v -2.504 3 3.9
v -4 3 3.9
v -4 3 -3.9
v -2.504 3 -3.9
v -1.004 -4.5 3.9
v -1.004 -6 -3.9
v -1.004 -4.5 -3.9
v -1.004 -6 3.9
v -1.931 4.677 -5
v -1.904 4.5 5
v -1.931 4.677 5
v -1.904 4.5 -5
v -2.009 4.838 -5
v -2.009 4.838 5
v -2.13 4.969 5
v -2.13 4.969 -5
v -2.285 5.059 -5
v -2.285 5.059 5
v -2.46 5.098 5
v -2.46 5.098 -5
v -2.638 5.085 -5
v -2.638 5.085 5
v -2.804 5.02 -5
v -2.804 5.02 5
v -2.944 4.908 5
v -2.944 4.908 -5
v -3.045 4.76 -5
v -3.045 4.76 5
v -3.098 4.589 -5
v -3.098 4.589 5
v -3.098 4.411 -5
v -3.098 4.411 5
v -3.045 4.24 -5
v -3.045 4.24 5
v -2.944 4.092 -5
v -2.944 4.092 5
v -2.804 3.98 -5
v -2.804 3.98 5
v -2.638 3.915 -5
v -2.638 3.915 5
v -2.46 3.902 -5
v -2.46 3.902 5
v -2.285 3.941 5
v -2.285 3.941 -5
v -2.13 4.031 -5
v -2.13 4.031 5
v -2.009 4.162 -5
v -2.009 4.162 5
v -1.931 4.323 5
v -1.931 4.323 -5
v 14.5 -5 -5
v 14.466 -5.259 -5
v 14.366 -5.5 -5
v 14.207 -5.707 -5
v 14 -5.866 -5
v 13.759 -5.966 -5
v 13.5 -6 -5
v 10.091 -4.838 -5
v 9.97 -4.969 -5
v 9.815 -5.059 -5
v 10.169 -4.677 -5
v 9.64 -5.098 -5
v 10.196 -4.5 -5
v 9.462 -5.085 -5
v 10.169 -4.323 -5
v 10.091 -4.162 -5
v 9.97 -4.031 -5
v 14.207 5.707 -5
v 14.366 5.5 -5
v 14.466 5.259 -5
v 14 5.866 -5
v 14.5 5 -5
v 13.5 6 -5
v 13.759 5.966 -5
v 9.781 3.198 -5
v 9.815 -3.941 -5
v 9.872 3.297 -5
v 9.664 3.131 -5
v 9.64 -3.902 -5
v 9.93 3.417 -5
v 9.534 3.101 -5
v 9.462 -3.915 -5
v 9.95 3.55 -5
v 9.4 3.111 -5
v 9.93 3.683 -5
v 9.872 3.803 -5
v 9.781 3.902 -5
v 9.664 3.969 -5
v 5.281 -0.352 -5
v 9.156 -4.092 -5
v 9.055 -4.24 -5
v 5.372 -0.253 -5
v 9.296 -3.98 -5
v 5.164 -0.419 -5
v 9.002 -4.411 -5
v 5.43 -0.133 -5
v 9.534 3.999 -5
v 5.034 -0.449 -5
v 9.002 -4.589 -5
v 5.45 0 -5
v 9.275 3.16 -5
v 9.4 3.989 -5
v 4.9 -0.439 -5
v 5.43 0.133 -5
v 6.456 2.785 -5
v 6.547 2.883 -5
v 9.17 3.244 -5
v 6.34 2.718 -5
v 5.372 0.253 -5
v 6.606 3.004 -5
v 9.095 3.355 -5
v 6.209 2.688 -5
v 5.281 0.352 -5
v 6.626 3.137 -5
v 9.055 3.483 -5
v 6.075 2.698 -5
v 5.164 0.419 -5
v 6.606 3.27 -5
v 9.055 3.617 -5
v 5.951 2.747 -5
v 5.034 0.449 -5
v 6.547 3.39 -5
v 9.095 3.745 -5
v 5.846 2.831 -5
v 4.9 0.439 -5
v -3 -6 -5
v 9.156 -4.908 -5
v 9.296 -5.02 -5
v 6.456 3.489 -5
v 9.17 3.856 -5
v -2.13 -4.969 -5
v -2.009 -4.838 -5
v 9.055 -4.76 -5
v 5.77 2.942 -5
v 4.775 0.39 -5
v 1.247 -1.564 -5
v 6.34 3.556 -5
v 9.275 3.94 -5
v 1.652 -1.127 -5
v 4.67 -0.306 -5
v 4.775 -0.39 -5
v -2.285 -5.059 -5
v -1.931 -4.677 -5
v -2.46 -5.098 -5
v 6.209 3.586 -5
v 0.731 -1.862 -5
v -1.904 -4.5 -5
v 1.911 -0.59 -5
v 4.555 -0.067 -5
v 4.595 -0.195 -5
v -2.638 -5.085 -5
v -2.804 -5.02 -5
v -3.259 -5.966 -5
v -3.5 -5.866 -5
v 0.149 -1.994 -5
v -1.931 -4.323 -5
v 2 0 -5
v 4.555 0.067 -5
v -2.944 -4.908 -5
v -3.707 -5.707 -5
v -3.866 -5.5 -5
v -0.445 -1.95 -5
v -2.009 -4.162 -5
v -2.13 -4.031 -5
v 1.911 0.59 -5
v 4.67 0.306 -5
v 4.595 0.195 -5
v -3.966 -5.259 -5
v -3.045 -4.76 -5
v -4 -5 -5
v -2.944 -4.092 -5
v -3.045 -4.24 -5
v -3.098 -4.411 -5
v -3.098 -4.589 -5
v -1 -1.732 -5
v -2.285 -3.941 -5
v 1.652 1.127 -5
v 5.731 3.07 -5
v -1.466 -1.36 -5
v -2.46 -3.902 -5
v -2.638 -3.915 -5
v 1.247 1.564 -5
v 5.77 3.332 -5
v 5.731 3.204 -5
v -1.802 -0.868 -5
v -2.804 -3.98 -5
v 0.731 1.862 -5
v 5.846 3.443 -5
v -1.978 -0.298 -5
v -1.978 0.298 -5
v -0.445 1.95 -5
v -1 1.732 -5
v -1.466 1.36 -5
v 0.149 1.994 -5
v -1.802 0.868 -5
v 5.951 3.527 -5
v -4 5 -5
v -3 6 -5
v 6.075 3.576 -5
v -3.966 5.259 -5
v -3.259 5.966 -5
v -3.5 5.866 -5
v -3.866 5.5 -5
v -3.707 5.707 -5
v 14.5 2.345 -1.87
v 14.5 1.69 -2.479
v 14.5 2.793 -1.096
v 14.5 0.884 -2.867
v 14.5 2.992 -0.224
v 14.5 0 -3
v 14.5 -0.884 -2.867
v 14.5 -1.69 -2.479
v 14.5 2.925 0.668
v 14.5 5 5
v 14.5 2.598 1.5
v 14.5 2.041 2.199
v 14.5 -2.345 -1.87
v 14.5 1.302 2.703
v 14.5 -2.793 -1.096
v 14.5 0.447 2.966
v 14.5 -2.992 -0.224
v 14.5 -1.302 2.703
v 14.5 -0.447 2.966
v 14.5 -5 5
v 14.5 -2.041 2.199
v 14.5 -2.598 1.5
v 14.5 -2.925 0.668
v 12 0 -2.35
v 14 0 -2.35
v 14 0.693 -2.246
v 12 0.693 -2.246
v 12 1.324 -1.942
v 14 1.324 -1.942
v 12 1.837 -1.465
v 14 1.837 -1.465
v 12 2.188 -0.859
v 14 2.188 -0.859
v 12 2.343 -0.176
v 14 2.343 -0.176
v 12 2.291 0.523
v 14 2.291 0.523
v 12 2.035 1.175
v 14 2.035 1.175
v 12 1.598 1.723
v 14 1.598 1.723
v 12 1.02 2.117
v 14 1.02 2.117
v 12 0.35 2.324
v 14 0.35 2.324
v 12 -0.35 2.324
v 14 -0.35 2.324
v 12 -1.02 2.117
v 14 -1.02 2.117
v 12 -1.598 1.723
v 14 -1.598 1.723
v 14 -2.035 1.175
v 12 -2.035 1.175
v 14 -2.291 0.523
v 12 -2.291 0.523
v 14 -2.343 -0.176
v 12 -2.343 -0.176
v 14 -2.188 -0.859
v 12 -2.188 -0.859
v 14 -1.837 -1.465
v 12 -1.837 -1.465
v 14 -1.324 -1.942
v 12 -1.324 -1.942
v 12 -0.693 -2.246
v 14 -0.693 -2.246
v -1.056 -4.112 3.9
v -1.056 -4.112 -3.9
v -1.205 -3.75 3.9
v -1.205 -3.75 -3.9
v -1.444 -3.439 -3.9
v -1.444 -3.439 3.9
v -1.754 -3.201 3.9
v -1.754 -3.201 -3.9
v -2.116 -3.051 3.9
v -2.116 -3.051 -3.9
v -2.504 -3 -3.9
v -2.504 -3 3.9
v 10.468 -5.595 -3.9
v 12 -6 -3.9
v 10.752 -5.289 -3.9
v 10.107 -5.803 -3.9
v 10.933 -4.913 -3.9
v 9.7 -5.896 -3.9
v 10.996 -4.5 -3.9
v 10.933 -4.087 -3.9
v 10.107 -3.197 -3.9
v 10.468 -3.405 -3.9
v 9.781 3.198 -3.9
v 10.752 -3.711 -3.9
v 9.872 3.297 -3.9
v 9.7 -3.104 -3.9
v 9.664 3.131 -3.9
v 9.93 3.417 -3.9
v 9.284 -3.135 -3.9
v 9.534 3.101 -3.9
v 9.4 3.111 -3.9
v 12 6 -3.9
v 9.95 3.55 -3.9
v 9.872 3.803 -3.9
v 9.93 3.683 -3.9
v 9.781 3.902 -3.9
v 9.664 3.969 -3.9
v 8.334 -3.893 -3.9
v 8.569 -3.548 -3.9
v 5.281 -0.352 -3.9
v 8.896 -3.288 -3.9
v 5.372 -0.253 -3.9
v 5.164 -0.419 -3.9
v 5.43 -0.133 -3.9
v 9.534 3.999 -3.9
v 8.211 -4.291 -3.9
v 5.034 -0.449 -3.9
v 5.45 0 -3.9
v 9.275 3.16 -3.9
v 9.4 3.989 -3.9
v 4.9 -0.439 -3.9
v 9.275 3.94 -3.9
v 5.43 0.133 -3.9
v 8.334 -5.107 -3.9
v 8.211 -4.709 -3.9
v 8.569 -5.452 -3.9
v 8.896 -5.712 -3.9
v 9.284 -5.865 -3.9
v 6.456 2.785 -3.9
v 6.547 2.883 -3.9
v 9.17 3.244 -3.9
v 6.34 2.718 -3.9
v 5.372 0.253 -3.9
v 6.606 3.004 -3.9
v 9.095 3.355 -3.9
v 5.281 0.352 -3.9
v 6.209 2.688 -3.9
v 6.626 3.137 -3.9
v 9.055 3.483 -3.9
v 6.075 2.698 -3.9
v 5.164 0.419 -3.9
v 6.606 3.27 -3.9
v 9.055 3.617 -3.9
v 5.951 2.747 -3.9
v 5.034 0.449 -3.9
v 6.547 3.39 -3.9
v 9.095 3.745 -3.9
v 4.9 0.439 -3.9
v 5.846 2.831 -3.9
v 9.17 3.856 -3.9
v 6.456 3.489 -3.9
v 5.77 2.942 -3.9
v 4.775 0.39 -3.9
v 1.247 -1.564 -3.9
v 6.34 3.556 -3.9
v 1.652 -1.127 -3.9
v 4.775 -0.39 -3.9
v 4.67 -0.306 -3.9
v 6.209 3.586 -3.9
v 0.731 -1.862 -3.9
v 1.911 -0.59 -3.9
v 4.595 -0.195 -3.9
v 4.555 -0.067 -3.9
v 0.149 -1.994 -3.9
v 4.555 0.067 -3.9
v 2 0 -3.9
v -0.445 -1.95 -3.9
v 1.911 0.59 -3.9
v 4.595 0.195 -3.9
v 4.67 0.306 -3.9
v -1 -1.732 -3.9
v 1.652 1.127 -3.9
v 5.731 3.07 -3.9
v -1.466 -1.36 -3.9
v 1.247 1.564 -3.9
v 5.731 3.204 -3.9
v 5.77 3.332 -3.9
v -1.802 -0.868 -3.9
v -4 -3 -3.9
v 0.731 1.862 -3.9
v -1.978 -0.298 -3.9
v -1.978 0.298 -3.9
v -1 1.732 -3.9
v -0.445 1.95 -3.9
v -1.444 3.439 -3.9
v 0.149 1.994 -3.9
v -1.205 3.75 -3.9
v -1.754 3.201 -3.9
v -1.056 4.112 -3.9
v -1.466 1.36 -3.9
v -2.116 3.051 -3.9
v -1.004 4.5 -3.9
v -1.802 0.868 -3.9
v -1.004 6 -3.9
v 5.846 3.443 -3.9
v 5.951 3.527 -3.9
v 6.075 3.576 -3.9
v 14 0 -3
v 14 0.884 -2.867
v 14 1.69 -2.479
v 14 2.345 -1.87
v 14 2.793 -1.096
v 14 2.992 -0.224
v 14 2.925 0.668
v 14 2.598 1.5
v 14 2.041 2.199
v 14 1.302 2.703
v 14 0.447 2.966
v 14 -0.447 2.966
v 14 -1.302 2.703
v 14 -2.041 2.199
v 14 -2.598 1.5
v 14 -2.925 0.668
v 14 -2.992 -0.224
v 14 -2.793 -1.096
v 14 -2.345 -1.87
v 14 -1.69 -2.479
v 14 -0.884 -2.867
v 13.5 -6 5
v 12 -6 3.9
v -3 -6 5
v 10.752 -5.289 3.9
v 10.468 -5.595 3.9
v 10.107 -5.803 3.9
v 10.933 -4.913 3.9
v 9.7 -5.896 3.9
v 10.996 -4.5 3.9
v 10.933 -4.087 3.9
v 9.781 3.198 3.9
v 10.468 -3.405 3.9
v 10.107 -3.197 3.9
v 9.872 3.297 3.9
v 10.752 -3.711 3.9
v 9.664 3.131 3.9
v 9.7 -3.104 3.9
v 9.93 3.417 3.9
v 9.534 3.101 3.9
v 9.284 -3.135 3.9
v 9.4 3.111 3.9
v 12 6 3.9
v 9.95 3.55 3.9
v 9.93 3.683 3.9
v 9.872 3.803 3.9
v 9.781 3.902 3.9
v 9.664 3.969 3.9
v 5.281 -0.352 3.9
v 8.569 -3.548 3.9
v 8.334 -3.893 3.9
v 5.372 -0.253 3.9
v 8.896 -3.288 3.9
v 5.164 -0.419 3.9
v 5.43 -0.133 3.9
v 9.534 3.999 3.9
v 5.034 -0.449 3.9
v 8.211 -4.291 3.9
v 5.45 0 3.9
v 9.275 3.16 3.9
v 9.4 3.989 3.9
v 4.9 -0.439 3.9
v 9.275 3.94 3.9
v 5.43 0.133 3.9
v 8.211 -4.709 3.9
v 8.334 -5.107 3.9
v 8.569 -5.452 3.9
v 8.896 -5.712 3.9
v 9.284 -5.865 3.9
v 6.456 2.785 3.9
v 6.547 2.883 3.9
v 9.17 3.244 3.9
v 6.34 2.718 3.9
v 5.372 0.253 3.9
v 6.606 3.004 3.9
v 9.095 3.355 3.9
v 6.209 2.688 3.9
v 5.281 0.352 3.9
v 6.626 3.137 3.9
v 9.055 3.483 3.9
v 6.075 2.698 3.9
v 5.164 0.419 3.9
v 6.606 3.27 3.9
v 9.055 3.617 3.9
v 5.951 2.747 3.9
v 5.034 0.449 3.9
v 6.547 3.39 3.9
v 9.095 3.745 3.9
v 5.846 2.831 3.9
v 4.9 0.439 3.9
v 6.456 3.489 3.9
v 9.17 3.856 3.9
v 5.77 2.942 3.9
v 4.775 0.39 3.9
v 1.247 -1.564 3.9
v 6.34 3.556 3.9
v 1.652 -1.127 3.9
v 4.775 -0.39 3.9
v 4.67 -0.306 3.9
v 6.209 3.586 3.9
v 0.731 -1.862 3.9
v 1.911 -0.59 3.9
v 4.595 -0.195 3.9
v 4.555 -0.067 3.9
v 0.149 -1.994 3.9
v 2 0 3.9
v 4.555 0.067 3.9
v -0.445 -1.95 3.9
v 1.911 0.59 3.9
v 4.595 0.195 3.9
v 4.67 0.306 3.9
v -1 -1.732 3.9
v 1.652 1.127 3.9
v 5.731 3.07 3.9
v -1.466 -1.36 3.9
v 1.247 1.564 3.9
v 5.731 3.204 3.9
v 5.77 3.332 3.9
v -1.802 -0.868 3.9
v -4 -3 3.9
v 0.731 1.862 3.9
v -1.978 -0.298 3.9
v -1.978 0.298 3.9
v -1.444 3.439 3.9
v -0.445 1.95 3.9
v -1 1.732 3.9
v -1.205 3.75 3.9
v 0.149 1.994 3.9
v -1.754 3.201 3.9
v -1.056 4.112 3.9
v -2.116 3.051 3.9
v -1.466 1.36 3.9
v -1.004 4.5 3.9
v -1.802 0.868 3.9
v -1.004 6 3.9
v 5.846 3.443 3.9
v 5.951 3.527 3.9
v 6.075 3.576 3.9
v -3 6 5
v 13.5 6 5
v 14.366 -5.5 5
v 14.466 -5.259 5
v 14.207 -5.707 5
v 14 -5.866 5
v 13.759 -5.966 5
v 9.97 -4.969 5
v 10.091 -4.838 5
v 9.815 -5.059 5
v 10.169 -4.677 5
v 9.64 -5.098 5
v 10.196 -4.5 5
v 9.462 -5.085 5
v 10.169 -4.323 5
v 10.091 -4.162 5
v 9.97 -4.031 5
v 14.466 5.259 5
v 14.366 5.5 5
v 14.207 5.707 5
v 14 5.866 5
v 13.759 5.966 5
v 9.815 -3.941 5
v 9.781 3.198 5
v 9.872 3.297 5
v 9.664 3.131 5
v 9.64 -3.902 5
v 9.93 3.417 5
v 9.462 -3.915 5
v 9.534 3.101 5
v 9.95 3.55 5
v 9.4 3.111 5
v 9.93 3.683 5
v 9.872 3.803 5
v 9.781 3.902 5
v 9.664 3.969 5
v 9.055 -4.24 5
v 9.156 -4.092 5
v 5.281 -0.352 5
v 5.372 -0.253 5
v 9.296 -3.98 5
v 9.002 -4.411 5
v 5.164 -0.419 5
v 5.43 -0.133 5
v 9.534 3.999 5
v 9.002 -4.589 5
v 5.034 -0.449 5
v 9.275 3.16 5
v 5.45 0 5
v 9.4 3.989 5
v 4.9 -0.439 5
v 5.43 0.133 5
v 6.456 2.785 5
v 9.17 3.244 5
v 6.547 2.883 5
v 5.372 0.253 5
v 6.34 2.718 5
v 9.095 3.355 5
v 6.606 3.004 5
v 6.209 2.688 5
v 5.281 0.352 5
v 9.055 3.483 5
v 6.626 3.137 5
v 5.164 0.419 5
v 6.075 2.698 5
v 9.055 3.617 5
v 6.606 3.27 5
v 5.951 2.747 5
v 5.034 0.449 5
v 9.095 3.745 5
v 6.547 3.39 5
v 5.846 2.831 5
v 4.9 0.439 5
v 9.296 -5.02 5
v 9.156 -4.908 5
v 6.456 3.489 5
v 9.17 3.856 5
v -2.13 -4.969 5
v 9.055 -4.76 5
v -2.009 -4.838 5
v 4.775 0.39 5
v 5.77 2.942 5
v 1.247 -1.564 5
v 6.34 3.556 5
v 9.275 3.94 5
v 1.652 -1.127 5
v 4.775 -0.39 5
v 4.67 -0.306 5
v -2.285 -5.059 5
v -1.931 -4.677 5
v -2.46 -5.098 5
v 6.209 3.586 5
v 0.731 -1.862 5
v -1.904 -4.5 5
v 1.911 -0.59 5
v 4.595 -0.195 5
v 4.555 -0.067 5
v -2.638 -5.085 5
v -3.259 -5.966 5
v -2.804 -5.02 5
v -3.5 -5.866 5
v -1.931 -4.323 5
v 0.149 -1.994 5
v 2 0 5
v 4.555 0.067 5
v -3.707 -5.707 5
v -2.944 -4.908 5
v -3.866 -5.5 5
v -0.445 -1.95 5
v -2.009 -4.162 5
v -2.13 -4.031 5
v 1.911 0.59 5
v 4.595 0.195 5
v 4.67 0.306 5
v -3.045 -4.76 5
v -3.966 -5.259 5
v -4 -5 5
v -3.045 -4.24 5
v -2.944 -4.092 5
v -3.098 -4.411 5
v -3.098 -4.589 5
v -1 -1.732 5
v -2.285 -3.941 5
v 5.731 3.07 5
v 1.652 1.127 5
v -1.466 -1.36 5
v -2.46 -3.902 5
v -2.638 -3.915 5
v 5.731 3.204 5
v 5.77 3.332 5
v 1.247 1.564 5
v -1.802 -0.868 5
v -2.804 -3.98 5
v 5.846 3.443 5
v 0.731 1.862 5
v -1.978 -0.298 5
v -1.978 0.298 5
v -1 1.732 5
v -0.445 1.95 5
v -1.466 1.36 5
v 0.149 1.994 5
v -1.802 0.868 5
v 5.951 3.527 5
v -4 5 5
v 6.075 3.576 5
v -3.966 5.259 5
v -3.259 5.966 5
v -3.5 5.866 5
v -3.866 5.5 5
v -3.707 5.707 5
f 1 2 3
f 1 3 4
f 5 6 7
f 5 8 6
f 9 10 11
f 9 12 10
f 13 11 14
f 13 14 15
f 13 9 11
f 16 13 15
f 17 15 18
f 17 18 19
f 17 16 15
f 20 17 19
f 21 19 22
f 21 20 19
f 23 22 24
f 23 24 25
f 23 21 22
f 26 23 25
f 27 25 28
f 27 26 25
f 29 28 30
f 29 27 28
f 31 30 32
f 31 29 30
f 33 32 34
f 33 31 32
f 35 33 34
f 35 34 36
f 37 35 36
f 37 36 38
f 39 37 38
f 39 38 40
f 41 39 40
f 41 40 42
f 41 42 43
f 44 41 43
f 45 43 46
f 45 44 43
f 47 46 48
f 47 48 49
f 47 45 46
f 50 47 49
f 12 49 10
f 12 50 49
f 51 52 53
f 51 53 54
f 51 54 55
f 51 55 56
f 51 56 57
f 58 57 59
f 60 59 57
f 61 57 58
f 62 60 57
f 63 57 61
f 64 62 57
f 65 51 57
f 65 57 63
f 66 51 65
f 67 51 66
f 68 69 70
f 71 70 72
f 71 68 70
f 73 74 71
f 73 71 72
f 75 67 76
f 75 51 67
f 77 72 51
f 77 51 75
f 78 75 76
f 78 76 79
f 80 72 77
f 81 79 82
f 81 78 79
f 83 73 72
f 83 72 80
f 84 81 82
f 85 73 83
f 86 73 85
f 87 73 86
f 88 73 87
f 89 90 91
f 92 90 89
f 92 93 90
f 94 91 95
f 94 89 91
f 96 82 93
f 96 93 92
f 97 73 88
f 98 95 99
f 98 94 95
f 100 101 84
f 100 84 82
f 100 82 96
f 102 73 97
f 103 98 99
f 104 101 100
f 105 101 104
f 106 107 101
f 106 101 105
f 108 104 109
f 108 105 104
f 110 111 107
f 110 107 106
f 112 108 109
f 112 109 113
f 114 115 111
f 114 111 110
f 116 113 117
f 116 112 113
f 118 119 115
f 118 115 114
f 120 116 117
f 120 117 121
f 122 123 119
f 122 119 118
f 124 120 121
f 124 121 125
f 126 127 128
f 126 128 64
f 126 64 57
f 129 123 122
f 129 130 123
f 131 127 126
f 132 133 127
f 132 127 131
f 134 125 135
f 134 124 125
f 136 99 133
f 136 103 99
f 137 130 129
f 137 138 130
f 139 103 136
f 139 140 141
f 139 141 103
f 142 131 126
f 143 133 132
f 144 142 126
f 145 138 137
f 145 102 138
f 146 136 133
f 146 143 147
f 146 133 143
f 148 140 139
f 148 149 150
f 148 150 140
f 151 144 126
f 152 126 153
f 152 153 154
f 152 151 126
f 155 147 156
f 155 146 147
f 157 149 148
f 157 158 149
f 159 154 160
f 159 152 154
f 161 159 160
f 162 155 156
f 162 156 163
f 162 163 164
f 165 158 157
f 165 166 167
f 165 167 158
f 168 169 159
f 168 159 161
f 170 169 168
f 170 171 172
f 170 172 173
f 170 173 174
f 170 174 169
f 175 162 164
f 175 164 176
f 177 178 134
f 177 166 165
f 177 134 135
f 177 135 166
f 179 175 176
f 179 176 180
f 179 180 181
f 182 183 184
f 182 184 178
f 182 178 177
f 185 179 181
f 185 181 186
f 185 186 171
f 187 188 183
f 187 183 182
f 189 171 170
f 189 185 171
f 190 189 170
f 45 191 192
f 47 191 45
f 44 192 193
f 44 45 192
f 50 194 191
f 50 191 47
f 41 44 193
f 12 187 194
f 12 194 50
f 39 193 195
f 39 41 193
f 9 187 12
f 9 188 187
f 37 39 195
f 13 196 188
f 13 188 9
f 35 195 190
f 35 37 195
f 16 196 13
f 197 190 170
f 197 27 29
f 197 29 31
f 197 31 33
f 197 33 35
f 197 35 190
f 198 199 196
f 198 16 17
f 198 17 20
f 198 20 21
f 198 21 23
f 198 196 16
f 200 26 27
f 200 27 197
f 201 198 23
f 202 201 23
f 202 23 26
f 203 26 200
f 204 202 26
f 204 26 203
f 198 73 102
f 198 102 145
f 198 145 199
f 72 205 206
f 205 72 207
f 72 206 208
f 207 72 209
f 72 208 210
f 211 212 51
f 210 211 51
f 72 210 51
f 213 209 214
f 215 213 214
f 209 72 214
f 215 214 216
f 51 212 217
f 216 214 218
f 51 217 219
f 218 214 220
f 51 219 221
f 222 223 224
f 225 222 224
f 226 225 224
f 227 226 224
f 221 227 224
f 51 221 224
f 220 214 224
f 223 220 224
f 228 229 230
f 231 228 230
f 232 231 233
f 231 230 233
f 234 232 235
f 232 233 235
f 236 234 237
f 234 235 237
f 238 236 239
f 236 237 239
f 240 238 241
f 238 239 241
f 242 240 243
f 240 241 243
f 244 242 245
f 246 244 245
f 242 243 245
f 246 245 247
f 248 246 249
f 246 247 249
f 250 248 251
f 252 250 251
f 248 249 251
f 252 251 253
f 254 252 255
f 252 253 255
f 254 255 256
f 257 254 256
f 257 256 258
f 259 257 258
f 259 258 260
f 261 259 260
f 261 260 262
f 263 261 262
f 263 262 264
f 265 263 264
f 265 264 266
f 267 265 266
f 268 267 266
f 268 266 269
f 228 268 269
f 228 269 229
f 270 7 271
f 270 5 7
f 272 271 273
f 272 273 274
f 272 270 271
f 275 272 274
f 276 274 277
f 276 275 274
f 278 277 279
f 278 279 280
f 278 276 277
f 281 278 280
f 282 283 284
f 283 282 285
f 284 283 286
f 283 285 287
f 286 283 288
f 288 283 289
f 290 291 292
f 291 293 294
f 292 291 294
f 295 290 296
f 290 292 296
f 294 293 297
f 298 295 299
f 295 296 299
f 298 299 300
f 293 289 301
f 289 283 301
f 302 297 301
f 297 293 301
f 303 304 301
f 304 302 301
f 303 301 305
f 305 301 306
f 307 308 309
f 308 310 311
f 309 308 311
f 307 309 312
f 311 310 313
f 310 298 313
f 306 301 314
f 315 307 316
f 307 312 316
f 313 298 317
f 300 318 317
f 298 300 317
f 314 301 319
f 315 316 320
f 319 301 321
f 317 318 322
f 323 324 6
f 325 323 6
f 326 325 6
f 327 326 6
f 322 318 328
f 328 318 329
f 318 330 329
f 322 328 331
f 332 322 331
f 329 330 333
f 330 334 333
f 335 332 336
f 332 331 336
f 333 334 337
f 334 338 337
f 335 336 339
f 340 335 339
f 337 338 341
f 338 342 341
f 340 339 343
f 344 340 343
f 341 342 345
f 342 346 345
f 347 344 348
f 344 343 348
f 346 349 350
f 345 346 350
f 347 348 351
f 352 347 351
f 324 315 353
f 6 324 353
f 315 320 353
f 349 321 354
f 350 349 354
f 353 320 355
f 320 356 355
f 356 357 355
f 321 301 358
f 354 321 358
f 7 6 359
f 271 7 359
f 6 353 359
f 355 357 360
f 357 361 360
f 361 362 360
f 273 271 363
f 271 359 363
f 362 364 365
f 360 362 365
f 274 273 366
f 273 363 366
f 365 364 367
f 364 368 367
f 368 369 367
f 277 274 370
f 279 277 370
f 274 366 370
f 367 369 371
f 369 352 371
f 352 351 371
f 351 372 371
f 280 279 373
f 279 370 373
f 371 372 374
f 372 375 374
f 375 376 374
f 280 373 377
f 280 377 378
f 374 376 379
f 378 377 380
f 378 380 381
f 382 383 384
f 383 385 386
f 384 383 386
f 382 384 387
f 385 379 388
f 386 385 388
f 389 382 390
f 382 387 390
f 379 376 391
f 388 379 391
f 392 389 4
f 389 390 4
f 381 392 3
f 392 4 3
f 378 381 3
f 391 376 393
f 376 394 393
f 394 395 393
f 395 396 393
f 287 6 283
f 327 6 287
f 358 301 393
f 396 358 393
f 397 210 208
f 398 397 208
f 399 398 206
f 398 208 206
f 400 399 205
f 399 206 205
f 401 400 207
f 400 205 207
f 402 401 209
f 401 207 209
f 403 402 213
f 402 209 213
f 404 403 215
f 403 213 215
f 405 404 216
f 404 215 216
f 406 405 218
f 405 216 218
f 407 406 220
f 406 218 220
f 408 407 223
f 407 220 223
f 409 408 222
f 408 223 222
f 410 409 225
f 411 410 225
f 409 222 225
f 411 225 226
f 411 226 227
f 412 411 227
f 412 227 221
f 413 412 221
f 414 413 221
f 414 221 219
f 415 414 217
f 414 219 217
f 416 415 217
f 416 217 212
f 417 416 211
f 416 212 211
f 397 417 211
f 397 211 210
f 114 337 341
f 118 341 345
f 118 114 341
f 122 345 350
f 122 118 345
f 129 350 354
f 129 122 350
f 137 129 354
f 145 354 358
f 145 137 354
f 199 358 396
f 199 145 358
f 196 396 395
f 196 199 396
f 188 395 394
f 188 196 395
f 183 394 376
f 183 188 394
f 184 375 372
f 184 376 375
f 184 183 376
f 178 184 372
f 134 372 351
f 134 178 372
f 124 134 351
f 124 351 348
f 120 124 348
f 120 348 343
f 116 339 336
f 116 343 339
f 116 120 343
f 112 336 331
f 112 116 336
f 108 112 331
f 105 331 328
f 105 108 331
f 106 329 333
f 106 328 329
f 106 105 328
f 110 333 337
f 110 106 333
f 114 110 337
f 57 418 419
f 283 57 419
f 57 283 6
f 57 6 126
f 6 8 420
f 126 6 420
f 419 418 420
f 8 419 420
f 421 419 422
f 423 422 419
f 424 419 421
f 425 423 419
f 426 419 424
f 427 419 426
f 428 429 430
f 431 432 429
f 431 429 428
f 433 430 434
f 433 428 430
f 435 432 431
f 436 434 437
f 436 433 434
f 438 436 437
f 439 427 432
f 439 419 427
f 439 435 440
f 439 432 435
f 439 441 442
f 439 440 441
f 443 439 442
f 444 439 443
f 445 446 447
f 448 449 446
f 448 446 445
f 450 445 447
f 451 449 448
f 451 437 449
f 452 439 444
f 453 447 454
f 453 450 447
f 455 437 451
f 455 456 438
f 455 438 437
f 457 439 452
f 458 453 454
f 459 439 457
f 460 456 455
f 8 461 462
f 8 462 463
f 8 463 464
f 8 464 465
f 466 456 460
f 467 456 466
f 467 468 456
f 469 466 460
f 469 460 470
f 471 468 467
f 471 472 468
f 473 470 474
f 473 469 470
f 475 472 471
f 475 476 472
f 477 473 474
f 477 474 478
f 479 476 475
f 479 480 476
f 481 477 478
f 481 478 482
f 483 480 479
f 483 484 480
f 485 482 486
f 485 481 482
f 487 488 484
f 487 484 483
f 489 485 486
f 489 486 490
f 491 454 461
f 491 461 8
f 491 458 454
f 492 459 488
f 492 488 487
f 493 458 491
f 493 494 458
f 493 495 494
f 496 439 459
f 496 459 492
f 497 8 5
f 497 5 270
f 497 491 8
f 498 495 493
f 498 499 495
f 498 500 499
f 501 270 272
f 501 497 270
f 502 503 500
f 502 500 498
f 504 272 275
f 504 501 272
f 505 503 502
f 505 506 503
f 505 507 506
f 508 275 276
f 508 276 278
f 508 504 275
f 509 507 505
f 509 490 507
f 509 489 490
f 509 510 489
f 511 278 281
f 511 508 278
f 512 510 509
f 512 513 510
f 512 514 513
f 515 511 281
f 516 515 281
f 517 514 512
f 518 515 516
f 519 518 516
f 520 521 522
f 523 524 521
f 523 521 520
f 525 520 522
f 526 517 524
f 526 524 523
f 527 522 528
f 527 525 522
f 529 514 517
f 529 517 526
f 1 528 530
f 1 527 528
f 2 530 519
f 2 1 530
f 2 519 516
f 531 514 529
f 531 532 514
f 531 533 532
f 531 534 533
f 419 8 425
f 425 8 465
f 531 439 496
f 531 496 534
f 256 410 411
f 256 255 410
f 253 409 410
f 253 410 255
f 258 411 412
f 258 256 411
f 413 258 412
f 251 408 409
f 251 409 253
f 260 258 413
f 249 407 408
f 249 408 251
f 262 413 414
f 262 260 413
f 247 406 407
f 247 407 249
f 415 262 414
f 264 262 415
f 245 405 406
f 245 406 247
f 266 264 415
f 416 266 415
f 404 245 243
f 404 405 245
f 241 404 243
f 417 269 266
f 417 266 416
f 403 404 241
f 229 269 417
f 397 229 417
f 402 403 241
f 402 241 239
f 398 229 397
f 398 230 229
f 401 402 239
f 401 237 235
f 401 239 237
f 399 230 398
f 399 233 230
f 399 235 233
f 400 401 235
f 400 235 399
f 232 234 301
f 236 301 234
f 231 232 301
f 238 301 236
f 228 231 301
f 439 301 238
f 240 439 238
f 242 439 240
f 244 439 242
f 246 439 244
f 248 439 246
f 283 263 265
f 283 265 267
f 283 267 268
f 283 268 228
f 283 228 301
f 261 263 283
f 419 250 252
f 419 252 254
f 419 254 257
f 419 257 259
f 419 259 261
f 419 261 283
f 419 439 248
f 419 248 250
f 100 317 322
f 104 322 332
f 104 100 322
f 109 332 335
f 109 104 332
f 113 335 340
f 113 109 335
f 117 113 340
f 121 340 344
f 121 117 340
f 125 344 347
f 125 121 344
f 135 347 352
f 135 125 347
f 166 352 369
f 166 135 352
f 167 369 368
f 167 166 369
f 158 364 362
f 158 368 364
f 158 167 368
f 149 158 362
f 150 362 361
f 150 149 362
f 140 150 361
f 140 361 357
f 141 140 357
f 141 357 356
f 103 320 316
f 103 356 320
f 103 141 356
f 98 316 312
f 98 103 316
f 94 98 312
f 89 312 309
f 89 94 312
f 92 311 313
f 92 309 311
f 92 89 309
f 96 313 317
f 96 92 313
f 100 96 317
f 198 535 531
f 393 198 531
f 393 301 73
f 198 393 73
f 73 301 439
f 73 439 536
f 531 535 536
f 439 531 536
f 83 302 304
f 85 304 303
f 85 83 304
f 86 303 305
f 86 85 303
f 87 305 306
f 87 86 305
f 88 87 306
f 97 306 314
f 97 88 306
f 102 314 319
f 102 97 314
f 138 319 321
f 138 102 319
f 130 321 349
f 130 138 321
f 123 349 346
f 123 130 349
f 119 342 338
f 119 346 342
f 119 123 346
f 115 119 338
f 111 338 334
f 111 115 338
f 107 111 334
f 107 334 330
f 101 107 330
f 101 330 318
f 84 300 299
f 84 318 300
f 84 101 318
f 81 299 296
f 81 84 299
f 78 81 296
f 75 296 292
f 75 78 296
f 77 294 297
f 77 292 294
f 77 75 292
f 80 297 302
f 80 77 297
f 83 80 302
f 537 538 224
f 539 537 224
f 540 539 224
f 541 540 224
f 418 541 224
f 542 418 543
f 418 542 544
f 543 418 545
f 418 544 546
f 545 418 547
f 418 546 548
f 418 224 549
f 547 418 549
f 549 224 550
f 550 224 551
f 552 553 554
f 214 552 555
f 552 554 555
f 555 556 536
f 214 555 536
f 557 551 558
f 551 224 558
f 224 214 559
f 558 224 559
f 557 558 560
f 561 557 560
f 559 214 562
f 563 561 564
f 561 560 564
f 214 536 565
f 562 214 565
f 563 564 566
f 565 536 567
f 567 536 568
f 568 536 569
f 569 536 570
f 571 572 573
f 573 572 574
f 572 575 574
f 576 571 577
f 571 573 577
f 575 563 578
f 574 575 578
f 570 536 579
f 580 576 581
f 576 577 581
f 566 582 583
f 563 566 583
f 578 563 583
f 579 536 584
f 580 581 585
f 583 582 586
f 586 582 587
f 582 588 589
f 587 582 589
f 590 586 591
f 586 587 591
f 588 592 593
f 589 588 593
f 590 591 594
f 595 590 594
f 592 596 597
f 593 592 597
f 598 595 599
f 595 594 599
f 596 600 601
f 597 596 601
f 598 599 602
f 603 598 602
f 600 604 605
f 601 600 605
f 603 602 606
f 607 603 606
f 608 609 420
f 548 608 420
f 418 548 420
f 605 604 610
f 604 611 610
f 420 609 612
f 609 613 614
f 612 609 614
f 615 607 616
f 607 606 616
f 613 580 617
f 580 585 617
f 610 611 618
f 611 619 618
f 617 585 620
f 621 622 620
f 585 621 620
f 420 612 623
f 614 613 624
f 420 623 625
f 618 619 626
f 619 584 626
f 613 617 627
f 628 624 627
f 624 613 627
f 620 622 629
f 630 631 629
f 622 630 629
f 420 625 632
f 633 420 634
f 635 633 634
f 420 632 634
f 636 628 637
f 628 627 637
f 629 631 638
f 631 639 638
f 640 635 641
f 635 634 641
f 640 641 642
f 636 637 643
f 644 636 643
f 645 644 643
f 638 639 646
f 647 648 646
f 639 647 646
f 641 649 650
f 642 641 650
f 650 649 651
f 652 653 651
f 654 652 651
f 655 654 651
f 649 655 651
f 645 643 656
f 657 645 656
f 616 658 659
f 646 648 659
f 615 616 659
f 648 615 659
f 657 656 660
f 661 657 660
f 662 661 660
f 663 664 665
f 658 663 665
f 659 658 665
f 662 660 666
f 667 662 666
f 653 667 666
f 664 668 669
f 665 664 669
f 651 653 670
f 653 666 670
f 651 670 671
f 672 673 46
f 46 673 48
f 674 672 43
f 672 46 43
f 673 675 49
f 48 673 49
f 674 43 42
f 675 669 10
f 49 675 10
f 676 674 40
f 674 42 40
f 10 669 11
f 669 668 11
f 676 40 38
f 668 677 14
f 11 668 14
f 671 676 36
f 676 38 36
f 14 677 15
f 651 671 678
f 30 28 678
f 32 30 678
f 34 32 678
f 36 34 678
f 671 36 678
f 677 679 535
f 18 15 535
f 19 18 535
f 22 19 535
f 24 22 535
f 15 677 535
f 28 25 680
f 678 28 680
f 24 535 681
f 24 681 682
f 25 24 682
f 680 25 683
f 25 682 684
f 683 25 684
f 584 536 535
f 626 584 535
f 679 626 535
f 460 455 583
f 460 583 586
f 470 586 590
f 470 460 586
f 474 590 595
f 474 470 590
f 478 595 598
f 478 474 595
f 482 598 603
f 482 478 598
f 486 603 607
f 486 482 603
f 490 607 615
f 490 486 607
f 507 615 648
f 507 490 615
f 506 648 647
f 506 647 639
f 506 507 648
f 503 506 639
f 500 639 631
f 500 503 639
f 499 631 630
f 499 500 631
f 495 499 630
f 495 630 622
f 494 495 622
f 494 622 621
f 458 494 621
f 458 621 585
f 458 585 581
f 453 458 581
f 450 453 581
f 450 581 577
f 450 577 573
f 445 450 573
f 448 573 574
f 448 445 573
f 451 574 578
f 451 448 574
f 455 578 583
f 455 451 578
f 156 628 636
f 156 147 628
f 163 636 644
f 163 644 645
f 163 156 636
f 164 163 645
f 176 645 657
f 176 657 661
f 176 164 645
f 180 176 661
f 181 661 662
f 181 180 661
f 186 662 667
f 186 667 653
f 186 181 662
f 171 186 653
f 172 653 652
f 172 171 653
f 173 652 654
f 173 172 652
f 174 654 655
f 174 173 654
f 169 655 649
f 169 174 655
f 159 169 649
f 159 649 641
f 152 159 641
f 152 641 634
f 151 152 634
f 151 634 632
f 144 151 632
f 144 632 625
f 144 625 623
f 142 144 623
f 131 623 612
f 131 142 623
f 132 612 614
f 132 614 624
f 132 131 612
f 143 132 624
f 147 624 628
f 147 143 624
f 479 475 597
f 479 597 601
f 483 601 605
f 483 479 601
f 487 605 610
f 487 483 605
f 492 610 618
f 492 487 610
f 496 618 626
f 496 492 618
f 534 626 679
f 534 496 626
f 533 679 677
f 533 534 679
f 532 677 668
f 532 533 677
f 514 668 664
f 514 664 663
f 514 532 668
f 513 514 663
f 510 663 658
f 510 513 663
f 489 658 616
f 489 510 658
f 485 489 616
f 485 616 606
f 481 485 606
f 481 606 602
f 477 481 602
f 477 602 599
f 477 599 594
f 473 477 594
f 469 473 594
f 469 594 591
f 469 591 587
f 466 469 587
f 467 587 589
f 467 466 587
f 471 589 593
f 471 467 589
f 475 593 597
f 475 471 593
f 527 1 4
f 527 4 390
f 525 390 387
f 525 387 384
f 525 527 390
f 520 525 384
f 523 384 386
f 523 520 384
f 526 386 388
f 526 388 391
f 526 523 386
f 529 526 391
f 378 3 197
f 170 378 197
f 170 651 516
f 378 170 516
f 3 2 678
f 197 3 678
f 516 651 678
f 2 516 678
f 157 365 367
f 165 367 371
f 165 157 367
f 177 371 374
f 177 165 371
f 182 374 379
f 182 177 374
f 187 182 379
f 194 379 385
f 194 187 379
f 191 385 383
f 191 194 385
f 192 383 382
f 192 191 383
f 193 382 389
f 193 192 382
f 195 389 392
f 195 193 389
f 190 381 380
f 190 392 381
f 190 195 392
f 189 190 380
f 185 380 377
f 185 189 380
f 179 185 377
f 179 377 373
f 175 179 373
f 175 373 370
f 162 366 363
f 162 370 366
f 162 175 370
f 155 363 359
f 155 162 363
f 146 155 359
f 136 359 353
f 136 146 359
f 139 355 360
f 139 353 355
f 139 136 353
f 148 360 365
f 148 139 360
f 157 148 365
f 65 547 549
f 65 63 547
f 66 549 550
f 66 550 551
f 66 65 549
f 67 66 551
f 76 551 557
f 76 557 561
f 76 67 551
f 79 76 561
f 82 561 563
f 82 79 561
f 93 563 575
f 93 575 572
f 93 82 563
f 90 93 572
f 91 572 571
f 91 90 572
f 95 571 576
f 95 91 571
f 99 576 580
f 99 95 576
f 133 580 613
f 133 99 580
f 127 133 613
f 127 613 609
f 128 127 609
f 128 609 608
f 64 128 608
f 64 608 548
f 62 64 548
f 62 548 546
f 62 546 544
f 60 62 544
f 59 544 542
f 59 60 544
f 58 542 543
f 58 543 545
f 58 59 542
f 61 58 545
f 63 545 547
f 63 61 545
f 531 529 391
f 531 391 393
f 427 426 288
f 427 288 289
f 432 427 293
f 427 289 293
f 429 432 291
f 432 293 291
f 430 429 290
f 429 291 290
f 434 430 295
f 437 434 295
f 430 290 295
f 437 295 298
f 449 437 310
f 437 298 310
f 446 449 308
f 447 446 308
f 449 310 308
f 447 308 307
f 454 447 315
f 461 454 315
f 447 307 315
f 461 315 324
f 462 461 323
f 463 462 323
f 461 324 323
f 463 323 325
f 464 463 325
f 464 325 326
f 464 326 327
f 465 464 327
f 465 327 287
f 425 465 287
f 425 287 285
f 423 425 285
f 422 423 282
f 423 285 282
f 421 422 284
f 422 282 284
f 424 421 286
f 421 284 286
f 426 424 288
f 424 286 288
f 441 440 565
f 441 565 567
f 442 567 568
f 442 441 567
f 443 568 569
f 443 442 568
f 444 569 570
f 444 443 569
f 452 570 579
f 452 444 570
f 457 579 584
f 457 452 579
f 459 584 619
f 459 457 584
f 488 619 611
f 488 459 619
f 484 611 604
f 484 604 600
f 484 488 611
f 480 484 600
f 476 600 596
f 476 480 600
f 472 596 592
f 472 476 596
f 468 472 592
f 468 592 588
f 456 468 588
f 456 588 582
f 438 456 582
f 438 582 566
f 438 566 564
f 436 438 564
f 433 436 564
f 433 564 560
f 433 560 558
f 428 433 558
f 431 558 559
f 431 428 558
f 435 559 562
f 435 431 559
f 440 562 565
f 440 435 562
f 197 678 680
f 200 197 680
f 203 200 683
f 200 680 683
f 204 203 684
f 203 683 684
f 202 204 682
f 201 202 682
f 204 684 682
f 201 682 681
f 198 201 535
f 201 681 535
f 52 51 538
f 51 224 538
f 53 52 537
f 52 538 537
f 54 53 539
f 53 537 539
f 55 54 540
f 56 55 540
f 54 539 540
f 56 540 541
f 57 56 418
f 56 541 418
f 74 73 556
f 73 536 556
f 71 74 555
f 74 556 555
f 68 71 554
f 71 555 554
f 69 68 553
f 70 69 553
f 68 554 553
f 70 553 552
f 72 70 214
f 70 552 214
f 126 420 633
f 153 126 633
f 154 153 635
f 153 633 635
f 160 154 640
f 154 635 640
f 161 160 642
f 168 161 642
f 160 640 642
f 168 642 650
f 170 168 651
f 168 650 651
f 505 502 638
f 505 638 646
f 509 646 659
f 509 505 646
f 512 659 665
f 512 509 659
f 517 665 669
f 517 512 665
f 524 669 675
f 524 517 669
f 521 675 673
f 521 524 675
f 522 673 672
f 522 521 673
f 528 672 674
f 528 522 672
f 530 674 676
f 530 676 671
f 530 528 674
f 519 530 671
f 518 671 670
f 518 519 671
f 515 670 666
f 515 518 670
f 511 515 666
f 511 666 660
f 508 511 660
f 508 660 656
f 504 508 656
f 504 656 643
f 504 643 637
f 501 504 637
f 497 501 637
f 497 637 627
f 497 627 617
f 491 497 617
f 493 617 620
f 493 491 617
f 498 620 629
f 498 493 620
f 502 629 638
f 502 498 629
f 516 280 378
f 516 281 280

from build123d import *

# Parameters (mm, degrees)
BODYSKE_R   = 2
BODYSKE_R_2 = 0.45
BODYSKE_R_3 = 0.6
BODY_DEPTH  = 5
BOXSKE_R    = 1.4
BOX_DEPTH   = 3.9
HOLESKE_R   = 2.35
HOLE_DEPTH  = 21.081085628
PADSKE_R    = 3
PAD_DEPTH   = 0.5


with BuildPart() as part:
    # BodySke → Body (new, symmetric)
    with BuildSketch(Plane.XY):
        with BuildLine():
            Line((-3, 6), (13.5, 6))
            ThreePointArc((13.5, 6), (14.207106781, 5.707106781), (14.5, 5))
            Line((14.5, 5), (14.5, -5))
            ThreePointArc((14.5, -5), (14.207106781, -5.707106781), (13.5, -6))
            Line((13.5, -6), (-3, -6))
            ThreePointArc((-3, -6), (-3.707106781, -5.707106781), (-4, -5))
            Line((-4, -5), (-4, 5))
            ThreePointArc((-4, 5), (-3.707106781, 5.707106781), (-3, 6))
        make_face()
        Circle(BODYSKE_R, mode=Mode.SUBTRACT)
        with Locations((5, 0)):
            Circle(BODYSKE_R_2, mode=Mode.SUBTRACT)
        with Locations((-2.504495957, 4.5)):
            Circle(BODYSKE_R_3, mode=Mode.SUBTRACT)
        with Locations((-2.504495957, -4.5)):
            Circle(BODYSKE_R_3, mode=Mode.SUBTRACT)
        with Locations((6.175559685, 3.136966596)):
            Circle(BODYSKE_R_2, mode=Mode.SUBTRACT)
        with Locations((9.5, 3.55)):
            Circle(BODYSKE_R_2, mode=Mode.SUBTRACT)
        with Locations((9.595504043, -4.5)):
            Circle(BODYSKE_R_3, mode=Mode.SUBTRACT)
    extrude(amount=BODY_DEPTH, both=True)

    # BoxSke → Box (cut, symmetric)
    with BuildSketch(Plane.XY):
        with BuildLine():
            Line((12, 6), (12, -6))
            Line((12, -6), (-1.004495957, -6))
            Line((-1.004495957, -6), (-1.004495957, -4.5))
            ThreePointArc((-1.004495957, -4.5), (-1.443835785, -3.439339828), (-2.504495957, -3))
            Line((-2.504495957, -3), (-4, -3))
            Line((-4, -3), (-4, 3))
            Line((-4, 3), (-2.504495957, 3))
            ThreePointArc((-2.504495957, 3), (-1.443835785, 3.439339828), (-1.004495957, 4.5))
            Line((-1.004495957, 4.5), (-1.004495957, 6))
            Line((-1.004495957, 6), (12, 6))
        make_face()
        with Locations((9.595504043, -4.5)):
            Circle(BOXSKE_R, mode=Mode.SUBTRACT)
    extrude(amount=BOX_DEPTH, both=True, mode=Mode.SUBTRACT)

    # HoleSke → Hole (cut, through all)
    with BuildSketch(Plane(origin=(14.5, 0, 0), x_dir=(0, 0, -1), z_dir=(1, 0, 0))):
        Circle(HOLESKE_R)
    extrude(amount=-HOLE_DEPTH, mode=Mode.SUBTRACT)

    # PadSke → Pad (cut)
    with BuildSketch(Plane(origin=(14.5, 0, 0), x_dir=(0, 0, -1), z_dir=(1, 0, 0))):
        Circle(PADSKE_R)
    extrude(amount=-PAD_DEPTH, mode=Mode.SUBTRACT)


solid = part.part
